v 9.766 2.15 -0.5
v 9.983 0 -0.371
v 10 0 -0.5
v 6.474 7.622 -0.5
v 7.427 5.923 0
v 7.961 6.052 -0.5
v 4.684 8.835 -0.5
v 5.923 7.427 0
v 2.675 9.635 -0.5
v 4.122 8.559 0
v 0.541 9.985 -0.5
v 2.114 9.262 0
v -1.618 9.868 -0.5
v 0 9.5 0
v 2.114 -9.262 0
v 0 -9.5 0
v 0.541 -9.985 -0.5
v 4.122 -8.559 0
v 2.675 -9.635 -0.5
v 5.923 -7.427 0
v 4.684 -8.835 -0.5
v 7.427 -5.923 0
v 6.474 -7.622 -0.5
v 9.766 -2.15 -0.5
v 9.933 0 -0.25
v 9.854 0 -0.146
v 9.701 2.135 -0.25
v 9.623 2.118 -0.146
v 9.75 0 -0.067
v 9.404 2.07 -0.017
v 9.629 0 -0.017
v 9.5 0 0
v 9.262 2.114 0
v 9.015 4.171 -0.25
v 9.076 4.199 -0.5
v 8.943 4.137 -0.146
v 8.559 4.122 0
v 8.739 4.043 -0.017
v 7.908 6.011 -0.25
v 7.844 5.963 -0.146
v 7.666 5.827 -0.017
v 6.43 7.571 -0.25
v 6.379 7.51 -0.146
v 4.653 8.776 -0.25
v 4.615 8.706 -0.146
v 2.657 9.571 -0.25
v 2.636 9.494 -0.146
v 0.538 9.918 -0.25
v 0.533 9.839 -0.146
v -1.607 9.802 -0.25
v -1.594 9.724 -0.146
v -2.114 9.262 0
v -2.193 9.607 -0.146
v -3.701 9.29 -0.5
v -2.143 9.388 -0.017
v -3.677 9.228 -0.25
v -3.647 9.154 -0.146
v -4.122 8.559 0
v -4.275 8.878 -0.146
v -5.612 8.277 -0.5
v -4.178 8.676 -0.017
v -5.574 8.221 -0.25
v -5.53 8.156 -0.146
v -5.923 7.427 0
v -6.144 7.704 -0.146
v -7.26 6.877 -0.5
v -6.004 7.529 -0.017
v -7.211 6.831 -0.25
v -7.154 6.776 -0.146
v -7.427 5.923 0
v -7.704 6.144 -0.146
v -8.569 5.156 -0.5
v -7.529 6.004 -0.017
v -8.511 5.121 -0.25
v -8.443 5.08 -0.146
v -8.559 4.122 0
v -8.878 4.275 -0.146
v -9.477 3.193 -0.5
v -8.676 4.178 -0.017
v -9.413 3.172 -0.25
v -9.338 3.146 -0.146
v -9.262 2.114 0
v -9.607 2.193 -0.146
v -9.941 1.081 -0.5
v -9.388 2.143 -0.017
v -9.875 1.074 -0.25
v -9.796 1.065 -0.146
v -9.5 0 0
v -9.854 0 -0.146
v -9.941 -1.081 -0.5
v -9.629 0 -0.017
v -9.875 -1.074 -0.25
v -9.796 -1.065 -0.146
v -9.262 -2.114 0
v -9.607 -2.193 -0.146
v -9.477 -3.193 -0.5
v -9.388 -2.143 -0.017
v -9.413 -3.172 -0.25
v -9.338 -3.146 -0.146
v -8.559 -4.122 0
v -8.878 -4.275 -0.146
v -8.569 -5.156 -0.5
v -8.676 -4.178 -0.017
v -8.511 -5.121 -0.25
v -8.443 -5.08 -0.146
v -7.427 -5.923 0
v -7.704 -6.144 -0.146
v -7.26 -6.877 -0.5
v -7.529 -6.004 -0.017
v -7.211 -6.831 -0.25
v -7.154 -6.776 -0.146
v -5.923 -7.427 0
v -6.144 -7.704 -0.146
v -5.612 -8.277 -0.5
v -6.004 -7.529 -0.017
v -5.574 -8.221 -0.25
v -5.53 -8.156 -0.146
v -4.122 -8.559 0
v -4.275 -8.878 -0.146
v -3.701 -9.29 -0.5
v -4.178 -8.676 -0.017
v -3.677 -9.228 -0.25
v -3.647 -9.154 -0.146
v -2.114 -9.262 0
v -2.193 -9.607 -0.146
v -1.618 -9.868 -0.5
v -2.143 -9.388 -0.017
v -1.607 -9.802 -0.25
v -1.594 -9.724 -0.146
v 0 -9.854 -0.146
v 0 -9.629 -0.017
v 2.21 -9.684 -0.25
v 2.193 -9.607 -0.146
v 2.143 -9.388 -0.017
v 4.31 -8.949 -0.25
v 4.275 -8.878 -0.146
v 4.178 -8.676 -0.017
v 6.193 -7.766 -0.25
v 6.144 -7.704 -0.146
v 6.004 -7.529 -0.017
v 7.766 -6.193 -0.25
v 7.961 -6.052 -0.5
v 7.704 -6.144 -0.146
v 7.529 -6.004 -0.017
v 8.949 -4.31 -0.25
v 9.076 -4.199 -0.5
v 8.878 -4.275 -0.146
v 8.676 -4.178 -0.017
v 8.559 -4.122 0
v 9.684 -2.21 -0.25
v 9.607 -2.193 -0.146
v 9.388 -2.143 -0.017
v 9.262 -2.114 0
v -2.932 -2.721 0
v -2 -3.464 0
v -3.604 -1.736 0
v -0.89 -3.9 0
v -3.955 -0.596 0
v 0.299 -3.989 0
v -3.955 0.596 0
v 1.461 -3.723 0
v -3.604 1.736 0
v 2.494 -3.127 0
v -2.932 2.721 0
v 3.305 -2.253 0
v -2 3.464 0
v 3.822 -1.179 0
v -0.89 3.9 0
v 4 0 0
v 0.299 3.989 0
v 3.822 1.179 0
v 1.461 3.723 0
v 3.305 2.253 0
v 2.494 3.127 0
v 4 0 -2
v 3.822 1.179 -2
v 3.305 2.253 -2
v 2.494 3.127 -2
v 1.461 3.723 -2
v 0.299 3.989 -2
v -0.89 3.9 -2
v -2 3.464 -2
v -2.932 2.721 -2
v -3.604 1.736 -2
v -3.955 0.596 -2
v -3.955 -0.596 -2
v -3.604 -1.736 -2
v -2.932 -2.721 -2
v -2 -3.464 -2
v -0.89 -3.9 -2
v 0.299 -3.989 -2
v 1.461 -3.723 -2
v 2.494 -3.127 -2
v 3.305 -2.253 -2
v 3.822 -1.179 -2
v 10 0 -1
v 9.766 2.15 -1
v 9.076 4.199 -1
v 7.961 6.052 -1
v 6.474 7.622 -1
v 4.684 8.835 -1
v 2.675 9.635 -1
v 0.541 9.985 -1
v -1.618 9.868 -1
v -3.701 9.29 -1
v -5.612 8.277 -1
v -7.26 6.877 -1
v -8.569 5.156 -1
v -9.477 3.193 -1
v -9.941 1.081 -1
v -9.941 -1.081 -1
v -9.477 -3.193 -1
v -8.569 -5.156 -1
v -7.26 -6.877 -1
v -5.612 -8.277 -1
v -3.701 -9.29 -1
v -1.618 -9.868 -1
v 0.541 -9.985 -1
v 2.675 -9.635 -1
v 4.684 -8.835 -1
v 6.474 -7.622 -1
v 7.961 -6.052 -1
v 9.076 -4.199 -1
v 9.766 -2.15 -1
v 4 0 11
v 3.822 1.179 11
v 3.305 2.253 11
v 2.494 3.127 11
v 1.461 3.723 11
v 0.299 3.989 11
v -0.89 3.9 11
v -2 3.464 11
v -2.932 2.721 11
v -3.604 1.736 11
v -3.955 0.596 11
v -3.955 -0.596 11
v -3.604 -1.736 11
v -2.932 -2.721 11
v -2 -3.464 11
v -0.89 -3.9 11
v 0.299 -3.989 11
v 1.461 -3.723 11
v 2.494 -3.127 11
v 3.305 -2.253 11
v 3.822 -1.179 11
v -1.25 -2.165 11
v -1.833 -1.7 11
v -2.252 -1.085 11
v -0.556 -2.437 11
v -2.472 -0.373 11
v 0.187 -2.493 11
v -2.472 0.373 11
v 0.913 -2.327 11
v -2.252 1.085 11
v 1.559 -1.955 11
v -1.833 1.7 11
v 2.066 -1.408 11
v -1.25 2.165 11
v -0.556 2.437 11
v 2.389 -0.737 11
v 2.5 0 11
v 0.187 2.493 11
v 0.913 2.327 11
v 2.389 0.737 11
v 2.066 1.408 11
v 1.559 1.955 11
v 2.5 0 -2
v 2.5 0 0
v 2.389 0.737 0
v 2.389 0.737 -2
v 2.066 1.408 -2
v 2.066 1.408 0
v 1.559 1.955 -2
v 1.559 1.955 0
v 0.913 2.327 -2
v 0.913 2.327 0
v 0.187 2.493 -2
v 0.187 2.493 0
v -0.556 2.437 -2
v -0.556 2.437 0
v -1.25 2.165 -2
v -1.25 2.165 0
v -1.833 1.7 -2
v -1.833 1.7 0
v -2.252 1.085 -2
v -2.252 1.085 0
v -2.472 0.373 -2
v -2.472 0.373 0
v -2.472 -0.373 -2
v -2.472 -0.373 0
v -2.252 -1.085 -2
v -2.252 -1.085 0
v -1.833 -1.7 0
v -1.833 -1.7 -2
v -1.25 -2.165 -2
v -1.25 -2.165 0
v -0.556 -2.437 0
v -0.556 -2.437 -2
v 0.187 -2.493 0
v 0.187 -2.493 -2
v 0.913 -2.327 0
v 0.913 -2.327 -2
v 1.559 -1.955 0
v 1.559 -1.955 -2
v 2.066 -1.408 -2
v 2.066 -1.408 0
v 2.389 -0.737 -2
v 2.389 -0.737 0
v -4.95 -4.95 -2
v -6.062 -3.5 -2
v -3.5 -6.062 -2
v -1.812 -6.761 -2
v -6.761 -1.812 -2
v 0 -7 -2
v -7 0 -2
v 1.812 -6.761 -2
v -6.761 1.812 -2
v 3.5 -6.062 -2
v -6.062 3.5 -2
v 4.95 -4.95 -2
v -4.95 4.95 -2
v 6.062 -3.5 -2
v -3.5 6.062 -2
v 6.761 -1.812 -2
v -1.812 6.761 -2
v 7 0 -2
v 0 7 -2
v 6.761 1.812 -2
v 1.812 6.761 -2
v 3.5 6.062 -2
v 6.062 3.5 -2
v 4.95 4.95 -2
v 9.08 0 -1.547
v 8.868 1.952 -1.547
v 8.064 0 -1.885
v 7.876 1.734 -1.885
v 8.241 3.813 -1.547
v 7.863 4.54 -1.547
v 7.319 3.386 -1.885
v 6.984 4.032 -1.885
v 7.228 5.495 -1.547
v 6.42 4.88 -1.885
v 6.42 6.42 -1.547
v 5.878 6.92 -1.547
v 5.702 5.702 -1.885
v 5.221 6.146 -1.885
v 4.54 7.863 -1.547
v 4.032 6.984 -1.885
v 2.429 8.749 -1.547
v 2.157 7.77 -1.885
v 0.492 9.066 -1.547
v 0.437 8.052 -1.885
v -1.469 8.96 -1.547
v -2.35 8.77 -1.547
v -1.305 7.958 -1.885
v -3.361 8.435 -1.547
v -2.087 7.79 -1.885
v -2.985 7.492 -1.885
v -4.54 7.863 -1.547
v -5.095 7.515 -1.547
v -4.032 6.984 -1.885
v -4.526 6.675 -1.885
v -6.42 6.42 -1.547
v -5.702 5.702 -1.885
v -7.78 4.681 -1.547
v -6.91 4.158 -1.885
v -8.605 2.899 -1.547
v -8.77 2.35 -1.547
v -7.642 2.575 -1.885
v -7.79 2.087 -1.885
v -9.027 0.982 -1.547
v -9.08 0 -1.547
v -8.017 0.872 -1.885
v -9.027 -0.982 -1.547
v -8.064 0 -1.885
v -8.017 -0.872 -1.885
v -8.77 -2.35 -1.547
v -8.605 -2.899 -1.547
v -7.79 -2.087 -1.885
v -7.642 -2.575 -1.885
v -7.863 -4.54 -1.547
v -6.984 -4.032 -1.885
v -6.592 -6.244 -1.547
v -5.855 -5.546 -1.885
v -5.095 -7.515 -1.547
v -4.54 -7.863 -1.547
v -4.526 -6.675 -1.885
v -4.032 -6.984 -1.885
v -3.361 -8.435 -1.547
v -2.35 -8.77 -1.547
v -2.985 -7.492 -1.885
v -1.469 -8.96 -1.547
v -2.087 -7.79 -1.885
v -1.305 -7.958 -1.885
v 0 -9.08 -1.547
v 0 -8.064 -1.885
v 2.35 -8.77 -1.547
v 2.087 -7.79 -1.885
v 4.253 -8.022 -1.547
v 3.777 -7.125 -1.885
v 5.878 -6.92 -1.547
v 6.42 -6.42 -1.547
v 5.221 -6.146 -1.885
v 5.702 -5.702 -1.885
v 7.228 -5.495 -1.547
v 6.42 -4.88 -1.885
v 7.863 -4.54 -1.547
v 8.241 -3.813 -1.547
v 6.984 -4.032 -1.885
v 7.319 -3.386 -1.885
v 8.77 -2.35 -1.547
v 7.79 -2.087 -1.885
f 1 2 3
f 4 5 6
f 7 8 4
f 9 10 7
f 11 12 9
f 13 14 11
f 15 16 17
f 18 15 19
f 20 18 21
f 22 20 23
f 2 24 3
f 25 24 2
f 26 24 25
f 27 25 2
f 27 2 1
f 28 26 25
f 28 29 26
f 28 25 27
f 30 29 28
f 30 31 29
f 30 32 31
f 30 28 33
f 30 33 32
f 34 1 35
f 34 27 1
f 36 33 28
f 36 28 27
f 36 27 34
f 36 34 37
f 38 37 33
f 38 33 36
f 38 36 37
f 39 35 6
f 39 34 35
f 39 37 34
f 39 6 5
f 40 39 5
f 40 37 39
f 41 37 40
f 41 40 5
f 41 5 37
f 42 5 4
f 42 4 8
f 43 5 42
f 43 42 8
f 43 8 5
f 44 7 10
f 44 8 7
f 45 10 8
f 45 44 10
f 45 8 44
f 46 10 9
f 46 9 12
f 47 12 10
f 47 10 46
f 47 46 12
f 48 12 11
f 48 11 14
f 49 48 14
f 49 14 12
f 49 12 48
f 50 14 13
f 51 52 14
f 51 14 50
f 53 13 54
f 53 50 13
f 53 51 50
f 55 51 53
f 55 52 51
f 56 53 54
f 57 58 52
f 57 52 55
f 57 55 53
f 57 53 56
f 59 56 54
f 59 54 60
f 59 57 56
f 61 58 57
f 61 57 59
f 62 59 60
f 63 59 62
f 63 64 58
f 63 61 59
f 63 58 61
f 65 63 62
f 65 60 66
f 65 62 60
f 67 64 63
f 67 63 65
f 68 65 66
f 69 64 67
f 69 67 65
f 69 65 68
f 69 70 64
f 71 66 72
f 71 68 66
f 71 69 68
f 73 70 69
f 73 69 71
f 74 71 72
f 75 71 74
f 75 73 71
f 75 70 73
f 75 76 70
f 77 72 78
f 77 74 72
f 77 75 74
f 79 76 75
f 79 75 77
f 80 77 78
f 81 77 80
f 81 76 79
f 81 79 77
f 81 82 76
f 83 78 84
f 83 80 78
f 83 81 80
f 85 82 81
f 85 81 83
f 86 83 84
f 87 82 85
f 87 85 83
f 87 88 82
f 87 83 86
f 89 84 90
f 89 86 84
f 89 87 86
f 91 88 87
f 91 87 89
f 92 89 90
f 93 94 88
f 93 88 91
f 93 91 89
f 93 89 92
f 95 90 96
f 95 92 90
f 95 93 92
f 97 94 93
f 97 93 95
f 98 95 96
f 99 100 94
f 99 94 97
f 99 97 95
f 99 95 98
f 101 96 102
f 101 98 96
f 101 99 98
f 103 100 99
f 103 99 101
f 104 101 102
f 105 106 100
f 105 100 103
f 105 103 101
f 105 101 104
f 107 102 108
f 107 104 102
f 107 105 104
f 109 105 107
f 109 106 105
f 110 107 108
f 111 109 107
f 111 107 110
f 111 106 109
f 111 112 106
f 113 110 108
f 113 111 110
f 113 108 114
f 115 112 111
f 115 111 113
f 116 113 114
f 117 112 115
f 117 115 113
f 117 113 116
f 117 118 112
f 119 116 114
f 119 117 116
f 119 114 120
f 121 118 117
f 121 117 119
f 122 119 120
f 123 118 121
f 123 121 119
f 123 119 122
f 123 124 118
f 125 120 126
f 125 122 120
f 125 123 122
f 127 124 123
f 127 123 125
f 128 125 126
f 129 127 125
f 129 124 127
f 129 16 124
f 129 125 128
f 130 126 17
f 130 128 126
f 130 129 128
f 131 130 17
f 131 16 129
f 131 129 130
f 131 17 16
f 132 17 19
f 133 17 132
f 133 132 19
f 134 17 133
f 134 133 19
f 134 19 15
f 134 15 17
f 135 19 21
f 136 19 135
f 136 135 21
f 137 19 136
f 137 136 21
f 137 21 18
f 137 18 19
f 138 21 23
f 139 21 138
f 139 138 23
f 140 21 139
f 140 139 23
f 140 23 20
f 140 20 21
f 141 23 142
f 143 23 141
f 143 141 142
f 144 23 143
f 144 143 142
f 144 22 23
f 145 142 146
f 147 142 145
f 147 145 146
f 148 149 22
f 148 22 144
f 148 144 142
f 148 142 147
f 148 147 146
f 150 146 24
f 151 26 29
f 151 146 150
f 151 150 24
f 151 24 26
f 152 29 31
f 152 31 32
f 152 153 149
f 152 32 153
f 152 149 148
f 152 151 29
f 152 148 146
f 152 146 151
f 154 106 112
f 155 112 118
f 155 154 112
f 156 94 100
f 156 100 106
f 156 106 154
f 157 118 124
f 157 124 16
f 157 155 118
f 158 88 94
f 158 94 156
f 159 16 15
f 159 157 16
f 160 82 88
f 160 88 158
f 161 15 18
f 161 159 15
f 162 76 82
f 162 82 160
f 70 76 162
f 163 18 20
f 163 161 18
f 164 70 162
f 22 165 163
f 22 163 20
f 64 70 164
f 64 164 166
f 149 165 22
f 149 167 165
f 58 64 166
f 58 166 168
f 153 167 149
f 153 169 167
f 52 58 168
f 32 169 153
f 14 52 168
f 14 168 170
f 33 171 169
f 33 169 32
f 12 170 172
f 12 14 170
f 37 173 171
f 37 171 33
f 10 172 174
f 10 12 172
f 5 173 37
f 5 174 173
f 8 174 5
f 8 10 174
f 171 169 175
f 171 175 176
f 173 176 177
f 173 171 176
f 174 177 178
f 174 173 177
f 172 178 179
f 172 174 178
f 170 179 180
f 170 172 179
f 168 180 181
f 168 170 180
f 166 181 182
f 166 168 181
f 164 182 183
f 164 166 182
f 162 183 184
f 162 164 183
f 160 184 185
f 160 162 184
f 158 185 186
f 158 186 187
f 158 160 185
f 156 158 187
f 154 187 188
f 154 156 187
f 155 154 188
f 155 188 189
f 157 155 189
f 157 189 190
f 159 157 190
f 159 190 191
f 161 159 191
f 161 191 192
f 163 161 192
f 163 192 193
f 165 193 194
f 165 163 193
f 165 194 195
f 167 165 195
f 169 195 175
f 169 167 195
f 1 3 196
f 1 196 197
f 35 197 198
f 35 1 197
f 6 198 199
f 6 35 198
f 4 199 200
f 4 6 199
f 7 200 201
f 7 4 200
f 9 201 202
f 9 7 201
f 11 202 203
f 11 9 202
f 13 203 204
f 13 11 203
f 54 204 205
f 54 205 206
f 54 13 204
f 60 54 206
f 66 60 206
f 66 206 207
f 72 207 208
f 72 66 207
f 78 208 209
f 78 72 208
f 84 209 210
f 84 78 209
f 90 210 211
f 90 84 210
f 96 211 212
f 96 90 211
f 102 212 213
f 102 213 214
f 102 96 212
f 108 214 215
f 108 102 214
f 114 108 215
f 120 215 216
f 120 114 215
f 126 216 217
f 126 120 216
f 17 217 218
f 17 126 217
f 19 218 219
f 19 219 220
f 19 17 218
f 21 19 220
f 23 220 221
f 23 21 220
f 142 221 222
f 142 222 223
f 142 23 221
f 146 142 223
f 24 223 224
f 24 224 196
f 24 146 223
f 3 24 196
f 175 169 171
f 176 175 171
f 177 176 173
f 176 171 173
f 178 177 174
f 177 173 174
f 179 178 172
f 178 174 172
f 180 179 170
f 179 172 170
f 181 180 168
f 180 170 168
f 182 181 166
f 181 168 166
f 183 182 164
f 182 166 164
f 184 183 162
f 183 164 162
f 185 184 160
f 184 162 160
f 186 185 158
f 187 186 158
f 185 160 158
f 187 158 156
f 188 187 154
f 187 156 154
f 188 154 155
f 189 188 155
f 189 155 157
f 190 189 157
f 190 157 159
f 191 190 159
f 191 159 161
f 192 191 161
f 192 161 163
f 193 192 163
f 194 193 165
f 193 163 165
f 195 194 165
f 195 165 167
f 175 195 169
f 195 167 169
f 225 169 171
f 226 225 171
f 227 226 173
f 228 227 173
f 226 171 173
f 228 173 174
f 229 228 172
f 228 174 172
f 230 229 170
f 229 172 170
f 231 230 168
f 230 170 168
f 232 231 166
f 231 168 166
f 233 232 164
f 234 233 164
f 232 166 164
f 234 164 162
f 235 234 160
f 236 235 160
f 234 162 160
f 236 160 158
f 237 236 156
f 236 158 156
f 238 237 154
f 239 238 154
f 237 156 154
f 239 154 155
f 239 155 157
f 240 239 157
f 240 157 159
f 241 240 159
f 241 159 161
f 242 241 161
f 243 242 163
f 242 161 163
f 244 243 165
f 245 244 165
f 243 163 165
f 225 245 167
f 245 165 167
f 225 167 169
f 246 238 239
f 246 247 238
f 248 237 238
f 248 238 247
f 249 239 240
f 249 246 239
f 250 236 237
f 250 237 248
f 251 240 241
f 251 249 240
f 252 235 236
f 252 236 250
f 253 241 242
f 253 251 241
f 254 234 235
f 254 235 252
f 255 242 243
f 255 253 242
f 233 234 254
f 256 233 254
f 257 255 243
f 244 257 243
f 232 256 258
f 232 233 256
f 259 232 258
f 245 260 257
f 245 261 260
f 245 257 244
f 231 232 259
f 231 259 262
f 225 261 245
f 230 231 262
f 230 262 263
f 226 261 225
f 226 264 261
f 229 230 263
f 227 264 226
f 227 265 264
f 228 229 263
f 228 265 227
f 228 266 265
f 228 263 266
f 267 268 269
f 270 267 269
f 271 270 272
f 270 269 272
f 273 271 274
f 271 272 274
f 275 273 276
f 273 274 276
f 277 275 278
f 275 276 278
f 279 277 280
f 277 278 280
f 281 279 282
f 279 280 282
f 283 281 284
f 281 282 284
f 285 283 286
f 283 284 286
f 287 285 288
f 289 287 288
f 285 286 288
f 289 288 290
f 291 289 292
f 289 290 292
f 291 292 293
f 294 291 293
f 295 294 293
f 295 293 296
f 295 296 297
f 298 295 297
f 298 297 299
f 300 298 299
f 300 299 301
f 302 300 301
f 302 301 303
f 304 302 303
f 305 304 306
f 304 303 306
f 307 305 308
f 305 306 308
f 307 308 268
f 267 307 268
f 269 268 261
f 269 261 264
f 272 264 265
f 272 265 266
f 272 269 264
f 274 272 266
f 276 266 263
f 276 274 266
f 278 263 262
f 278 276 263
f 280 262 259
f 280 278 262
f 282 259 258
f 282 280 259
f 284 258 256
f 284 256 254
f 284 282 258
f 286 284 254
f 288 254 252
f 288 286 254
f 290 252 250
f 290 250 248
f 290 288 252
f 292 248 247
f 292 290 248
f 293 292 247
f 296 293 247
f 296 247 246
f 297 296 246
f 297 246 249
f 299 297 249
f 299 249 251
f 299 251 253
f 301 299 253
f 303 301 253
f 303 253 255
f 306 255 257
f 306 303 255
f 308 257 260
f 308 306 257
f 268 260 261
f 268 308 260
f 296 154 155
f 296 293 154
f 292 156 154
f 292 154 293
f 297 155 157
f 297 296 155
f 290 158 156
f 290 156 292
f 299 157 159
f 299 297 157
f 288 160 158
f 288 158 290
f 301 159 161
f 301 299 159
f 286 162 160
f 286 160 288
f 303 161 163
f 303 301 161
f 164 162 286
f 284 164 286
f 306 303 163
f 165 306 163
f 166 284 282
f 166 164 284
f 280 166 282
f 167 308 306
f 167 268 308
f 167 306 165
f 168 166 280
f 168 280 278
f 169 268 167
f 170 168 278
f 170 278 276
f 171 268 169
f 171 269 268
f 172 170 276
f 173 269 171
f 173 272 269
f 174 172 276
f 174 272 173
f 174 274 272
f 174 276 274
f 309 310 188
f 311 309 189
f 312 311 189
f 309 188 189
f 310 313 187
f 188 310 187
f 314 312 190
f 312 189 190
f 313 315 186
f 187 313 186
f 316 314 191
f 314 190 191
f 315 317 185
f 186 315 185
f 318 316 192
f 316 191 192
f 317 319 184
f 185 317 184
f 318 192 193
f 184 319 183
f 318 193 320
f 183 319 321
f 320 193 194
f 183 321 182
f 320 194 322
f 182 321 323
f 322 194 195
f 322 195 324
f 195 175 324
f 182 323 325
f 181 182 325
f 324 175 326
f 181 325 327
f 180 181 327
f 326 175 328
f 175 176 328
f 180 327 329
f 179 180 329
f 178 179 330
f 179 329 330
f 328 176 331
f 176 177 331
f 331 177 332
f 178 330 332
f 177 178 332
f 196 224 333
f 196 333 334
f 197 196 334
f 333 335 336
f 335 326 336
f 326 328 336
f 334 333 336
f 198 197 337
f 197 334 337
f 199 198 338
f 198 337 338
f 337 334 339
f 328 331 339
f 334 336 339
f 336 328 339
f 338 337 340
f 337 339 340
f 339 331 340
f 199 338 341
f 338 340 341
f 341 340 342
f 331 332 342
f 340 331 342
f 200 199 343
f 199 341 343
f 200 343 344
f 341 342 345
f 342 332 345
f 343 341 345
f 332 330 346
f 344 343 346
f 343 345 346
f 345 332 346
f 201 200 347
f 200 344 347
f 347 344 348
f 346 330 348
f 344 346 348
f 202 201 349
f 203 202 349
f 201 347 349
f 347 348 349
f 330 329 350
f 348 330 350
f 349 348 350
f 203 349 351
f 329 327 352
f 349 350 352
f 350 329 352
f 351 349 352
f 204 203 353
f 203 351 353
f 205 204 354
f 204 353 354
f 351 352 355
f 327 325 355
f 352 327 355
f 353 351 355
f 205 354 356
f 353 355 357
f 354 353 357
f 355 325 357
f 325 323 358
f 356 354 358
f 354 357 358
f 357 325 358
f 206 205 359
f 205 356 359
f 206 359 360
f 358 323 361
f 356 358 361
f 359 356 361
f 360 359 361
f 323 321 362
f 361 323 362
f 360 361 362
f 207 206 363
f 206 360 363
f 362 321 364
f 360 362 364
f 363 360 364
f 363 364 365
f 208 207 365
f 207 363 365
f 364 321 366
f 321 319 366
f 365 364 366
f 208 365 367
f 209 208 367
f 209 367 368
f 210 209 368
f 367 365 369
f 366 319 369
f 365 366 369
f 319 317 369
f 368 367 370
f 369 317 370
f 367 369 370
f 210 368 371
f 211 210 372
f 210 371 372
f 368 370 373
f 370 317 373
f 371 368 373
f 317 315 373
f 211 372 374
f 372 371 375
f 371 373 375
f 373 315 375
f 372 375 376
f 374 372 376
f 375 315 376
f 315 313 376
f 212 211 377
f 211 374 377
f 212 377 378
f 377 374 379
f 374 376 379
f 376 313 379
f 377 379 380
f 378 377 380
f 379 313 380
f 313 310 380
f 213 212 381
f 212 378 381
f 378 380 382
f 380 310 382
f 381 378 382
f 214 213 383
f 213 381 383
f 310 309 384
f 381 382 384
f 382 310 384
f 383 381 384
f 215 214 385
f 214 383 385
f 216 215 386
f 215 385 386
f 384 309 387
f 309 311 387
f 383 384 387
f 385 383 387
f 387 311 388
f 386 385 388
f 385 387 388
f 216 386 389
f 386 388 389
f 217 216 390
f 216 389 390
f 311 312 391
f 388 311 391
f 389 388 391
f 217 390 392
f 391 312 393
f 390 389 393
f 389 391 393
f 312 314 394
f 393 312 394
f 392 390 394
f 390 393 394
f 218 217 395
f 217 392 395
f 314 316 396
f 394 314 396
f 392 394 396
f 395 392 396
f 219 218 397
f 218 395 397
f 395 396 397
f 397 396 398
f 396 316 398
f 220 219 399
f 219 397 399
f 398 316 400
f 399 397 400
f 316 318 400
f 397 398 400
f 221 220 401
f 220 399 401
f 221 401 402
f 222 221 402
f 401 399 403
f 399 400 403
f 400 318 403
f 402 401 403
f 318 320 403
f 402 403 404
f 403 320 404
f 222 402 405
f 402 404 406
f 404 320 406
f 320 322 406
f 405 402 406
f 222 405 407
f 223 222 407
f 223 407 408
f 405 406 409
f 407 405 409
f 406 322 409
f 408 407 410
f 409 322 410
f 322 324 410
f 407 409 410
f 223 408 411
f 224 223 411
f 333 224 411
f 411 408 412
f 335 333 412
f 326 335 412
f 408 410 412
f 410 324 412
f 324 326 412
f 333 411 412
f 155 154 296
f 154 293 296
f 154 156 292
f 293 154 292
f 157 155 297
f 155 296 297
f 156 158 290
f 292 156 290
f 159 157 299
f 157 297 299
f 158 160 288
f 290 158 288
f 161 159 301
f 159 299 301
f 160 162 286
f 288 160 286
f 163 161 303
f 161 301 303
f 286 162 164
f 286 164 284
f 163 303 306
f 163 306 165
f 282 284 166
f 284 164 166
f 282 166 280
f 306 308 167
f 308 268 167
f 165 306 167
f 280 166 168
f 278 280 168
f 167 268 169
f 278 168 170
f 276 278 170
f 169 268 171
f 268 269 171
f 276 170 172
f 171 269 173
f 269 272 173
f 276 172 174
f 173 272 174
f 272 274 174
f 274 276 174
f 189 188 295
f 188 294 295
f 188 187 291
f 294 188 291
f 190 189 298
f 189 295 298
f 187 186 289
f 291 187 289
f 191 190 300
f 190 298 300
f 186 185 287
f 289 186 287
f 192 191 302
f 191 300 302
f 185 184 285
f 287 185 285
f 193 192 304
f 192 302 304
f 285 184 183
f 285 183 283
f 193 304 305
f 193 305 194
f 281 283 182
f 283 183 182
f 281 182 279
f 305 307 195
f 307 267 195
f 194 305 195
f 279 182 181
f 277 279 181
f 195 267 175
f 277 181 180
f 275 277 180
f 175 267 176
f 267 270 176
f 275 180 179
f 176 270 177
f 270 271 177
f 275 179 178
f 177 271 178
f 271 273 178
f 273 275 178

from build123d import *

# Parameters (mm, degrees)
F0_R     = 10
F0_R_2   = 4
F1_DEPTH = 2
F0_R_3   = 2.5
F2_DEPTH = 11
F3_R     = 0.5
F4_DEPTH = 2
F5_SIZE  = 1


# Not quite as in the source:
# - a fillet or chamfer that OpenCascade refuses, or shapes differently, is made with other operations: its cross-section is extruded or revolved along the edge and cut away or added


with BuildPart() as f1:
    # F0 (on Top) → F1 (new body)
    with BuildSketch(Plane.XY):
        Circle(F0_R)
        Circle(F0_R_2, mode=Mode.SUBTRACT)
    extrude(amount=-F1_DEPTH)

    # F3
    f3_edges = [f1.edges().sort_by_distance(p)[0] for p in [
        (-10, 0, 0),
    ]]
    fillet(f3_edges, radius=F3_R)

    # F5
    f5_edges = [f1.edges().sort_by_distance(p)[0] for p in [
        (-10, 0, -2),
    ]]
    chamfer(f5_edges, length=F5_SIZE)

    # F6: fillet of radius 5 on 1 edges, made by hand

    # F6_s1 → F6_t2 (revolve, cut)
    with BuildSketch(Plane.XZ):
        with BuildLine():
            ThreePointArc((10, -1), (8.5811388301, -1.7434164903), (7, -2))
            Line((7, -2), (9, -2))
            Line((9, -2), (10, -1))
        make_face()
    revolve(axis=Axis((0, 0, -2), (0, 0, 1)), mode=Mode.SUBTRACT)


with BuildPart() as f2:
    # F0 (on Top) → F2 (new body)
    with BuildSketch(Plane.XY):
        Circle(F0_R_2)
        Circle(F0_R_3, mode=Mode.SUBTRACT)
    extrude(amount=F2_DEPTH)


with BuildPart() as f4:
    # F0 (on Top) → F4 (new body)
    with BuildSketch(Plane.XY):
        Circle(F0_R_2)
        Circle(F0_R_3, mode=Mode.SUBTRACT)
    extrude(amount=-F4_DEPTH)


solid = Compound([f1.part, f2.part, f4.part])
